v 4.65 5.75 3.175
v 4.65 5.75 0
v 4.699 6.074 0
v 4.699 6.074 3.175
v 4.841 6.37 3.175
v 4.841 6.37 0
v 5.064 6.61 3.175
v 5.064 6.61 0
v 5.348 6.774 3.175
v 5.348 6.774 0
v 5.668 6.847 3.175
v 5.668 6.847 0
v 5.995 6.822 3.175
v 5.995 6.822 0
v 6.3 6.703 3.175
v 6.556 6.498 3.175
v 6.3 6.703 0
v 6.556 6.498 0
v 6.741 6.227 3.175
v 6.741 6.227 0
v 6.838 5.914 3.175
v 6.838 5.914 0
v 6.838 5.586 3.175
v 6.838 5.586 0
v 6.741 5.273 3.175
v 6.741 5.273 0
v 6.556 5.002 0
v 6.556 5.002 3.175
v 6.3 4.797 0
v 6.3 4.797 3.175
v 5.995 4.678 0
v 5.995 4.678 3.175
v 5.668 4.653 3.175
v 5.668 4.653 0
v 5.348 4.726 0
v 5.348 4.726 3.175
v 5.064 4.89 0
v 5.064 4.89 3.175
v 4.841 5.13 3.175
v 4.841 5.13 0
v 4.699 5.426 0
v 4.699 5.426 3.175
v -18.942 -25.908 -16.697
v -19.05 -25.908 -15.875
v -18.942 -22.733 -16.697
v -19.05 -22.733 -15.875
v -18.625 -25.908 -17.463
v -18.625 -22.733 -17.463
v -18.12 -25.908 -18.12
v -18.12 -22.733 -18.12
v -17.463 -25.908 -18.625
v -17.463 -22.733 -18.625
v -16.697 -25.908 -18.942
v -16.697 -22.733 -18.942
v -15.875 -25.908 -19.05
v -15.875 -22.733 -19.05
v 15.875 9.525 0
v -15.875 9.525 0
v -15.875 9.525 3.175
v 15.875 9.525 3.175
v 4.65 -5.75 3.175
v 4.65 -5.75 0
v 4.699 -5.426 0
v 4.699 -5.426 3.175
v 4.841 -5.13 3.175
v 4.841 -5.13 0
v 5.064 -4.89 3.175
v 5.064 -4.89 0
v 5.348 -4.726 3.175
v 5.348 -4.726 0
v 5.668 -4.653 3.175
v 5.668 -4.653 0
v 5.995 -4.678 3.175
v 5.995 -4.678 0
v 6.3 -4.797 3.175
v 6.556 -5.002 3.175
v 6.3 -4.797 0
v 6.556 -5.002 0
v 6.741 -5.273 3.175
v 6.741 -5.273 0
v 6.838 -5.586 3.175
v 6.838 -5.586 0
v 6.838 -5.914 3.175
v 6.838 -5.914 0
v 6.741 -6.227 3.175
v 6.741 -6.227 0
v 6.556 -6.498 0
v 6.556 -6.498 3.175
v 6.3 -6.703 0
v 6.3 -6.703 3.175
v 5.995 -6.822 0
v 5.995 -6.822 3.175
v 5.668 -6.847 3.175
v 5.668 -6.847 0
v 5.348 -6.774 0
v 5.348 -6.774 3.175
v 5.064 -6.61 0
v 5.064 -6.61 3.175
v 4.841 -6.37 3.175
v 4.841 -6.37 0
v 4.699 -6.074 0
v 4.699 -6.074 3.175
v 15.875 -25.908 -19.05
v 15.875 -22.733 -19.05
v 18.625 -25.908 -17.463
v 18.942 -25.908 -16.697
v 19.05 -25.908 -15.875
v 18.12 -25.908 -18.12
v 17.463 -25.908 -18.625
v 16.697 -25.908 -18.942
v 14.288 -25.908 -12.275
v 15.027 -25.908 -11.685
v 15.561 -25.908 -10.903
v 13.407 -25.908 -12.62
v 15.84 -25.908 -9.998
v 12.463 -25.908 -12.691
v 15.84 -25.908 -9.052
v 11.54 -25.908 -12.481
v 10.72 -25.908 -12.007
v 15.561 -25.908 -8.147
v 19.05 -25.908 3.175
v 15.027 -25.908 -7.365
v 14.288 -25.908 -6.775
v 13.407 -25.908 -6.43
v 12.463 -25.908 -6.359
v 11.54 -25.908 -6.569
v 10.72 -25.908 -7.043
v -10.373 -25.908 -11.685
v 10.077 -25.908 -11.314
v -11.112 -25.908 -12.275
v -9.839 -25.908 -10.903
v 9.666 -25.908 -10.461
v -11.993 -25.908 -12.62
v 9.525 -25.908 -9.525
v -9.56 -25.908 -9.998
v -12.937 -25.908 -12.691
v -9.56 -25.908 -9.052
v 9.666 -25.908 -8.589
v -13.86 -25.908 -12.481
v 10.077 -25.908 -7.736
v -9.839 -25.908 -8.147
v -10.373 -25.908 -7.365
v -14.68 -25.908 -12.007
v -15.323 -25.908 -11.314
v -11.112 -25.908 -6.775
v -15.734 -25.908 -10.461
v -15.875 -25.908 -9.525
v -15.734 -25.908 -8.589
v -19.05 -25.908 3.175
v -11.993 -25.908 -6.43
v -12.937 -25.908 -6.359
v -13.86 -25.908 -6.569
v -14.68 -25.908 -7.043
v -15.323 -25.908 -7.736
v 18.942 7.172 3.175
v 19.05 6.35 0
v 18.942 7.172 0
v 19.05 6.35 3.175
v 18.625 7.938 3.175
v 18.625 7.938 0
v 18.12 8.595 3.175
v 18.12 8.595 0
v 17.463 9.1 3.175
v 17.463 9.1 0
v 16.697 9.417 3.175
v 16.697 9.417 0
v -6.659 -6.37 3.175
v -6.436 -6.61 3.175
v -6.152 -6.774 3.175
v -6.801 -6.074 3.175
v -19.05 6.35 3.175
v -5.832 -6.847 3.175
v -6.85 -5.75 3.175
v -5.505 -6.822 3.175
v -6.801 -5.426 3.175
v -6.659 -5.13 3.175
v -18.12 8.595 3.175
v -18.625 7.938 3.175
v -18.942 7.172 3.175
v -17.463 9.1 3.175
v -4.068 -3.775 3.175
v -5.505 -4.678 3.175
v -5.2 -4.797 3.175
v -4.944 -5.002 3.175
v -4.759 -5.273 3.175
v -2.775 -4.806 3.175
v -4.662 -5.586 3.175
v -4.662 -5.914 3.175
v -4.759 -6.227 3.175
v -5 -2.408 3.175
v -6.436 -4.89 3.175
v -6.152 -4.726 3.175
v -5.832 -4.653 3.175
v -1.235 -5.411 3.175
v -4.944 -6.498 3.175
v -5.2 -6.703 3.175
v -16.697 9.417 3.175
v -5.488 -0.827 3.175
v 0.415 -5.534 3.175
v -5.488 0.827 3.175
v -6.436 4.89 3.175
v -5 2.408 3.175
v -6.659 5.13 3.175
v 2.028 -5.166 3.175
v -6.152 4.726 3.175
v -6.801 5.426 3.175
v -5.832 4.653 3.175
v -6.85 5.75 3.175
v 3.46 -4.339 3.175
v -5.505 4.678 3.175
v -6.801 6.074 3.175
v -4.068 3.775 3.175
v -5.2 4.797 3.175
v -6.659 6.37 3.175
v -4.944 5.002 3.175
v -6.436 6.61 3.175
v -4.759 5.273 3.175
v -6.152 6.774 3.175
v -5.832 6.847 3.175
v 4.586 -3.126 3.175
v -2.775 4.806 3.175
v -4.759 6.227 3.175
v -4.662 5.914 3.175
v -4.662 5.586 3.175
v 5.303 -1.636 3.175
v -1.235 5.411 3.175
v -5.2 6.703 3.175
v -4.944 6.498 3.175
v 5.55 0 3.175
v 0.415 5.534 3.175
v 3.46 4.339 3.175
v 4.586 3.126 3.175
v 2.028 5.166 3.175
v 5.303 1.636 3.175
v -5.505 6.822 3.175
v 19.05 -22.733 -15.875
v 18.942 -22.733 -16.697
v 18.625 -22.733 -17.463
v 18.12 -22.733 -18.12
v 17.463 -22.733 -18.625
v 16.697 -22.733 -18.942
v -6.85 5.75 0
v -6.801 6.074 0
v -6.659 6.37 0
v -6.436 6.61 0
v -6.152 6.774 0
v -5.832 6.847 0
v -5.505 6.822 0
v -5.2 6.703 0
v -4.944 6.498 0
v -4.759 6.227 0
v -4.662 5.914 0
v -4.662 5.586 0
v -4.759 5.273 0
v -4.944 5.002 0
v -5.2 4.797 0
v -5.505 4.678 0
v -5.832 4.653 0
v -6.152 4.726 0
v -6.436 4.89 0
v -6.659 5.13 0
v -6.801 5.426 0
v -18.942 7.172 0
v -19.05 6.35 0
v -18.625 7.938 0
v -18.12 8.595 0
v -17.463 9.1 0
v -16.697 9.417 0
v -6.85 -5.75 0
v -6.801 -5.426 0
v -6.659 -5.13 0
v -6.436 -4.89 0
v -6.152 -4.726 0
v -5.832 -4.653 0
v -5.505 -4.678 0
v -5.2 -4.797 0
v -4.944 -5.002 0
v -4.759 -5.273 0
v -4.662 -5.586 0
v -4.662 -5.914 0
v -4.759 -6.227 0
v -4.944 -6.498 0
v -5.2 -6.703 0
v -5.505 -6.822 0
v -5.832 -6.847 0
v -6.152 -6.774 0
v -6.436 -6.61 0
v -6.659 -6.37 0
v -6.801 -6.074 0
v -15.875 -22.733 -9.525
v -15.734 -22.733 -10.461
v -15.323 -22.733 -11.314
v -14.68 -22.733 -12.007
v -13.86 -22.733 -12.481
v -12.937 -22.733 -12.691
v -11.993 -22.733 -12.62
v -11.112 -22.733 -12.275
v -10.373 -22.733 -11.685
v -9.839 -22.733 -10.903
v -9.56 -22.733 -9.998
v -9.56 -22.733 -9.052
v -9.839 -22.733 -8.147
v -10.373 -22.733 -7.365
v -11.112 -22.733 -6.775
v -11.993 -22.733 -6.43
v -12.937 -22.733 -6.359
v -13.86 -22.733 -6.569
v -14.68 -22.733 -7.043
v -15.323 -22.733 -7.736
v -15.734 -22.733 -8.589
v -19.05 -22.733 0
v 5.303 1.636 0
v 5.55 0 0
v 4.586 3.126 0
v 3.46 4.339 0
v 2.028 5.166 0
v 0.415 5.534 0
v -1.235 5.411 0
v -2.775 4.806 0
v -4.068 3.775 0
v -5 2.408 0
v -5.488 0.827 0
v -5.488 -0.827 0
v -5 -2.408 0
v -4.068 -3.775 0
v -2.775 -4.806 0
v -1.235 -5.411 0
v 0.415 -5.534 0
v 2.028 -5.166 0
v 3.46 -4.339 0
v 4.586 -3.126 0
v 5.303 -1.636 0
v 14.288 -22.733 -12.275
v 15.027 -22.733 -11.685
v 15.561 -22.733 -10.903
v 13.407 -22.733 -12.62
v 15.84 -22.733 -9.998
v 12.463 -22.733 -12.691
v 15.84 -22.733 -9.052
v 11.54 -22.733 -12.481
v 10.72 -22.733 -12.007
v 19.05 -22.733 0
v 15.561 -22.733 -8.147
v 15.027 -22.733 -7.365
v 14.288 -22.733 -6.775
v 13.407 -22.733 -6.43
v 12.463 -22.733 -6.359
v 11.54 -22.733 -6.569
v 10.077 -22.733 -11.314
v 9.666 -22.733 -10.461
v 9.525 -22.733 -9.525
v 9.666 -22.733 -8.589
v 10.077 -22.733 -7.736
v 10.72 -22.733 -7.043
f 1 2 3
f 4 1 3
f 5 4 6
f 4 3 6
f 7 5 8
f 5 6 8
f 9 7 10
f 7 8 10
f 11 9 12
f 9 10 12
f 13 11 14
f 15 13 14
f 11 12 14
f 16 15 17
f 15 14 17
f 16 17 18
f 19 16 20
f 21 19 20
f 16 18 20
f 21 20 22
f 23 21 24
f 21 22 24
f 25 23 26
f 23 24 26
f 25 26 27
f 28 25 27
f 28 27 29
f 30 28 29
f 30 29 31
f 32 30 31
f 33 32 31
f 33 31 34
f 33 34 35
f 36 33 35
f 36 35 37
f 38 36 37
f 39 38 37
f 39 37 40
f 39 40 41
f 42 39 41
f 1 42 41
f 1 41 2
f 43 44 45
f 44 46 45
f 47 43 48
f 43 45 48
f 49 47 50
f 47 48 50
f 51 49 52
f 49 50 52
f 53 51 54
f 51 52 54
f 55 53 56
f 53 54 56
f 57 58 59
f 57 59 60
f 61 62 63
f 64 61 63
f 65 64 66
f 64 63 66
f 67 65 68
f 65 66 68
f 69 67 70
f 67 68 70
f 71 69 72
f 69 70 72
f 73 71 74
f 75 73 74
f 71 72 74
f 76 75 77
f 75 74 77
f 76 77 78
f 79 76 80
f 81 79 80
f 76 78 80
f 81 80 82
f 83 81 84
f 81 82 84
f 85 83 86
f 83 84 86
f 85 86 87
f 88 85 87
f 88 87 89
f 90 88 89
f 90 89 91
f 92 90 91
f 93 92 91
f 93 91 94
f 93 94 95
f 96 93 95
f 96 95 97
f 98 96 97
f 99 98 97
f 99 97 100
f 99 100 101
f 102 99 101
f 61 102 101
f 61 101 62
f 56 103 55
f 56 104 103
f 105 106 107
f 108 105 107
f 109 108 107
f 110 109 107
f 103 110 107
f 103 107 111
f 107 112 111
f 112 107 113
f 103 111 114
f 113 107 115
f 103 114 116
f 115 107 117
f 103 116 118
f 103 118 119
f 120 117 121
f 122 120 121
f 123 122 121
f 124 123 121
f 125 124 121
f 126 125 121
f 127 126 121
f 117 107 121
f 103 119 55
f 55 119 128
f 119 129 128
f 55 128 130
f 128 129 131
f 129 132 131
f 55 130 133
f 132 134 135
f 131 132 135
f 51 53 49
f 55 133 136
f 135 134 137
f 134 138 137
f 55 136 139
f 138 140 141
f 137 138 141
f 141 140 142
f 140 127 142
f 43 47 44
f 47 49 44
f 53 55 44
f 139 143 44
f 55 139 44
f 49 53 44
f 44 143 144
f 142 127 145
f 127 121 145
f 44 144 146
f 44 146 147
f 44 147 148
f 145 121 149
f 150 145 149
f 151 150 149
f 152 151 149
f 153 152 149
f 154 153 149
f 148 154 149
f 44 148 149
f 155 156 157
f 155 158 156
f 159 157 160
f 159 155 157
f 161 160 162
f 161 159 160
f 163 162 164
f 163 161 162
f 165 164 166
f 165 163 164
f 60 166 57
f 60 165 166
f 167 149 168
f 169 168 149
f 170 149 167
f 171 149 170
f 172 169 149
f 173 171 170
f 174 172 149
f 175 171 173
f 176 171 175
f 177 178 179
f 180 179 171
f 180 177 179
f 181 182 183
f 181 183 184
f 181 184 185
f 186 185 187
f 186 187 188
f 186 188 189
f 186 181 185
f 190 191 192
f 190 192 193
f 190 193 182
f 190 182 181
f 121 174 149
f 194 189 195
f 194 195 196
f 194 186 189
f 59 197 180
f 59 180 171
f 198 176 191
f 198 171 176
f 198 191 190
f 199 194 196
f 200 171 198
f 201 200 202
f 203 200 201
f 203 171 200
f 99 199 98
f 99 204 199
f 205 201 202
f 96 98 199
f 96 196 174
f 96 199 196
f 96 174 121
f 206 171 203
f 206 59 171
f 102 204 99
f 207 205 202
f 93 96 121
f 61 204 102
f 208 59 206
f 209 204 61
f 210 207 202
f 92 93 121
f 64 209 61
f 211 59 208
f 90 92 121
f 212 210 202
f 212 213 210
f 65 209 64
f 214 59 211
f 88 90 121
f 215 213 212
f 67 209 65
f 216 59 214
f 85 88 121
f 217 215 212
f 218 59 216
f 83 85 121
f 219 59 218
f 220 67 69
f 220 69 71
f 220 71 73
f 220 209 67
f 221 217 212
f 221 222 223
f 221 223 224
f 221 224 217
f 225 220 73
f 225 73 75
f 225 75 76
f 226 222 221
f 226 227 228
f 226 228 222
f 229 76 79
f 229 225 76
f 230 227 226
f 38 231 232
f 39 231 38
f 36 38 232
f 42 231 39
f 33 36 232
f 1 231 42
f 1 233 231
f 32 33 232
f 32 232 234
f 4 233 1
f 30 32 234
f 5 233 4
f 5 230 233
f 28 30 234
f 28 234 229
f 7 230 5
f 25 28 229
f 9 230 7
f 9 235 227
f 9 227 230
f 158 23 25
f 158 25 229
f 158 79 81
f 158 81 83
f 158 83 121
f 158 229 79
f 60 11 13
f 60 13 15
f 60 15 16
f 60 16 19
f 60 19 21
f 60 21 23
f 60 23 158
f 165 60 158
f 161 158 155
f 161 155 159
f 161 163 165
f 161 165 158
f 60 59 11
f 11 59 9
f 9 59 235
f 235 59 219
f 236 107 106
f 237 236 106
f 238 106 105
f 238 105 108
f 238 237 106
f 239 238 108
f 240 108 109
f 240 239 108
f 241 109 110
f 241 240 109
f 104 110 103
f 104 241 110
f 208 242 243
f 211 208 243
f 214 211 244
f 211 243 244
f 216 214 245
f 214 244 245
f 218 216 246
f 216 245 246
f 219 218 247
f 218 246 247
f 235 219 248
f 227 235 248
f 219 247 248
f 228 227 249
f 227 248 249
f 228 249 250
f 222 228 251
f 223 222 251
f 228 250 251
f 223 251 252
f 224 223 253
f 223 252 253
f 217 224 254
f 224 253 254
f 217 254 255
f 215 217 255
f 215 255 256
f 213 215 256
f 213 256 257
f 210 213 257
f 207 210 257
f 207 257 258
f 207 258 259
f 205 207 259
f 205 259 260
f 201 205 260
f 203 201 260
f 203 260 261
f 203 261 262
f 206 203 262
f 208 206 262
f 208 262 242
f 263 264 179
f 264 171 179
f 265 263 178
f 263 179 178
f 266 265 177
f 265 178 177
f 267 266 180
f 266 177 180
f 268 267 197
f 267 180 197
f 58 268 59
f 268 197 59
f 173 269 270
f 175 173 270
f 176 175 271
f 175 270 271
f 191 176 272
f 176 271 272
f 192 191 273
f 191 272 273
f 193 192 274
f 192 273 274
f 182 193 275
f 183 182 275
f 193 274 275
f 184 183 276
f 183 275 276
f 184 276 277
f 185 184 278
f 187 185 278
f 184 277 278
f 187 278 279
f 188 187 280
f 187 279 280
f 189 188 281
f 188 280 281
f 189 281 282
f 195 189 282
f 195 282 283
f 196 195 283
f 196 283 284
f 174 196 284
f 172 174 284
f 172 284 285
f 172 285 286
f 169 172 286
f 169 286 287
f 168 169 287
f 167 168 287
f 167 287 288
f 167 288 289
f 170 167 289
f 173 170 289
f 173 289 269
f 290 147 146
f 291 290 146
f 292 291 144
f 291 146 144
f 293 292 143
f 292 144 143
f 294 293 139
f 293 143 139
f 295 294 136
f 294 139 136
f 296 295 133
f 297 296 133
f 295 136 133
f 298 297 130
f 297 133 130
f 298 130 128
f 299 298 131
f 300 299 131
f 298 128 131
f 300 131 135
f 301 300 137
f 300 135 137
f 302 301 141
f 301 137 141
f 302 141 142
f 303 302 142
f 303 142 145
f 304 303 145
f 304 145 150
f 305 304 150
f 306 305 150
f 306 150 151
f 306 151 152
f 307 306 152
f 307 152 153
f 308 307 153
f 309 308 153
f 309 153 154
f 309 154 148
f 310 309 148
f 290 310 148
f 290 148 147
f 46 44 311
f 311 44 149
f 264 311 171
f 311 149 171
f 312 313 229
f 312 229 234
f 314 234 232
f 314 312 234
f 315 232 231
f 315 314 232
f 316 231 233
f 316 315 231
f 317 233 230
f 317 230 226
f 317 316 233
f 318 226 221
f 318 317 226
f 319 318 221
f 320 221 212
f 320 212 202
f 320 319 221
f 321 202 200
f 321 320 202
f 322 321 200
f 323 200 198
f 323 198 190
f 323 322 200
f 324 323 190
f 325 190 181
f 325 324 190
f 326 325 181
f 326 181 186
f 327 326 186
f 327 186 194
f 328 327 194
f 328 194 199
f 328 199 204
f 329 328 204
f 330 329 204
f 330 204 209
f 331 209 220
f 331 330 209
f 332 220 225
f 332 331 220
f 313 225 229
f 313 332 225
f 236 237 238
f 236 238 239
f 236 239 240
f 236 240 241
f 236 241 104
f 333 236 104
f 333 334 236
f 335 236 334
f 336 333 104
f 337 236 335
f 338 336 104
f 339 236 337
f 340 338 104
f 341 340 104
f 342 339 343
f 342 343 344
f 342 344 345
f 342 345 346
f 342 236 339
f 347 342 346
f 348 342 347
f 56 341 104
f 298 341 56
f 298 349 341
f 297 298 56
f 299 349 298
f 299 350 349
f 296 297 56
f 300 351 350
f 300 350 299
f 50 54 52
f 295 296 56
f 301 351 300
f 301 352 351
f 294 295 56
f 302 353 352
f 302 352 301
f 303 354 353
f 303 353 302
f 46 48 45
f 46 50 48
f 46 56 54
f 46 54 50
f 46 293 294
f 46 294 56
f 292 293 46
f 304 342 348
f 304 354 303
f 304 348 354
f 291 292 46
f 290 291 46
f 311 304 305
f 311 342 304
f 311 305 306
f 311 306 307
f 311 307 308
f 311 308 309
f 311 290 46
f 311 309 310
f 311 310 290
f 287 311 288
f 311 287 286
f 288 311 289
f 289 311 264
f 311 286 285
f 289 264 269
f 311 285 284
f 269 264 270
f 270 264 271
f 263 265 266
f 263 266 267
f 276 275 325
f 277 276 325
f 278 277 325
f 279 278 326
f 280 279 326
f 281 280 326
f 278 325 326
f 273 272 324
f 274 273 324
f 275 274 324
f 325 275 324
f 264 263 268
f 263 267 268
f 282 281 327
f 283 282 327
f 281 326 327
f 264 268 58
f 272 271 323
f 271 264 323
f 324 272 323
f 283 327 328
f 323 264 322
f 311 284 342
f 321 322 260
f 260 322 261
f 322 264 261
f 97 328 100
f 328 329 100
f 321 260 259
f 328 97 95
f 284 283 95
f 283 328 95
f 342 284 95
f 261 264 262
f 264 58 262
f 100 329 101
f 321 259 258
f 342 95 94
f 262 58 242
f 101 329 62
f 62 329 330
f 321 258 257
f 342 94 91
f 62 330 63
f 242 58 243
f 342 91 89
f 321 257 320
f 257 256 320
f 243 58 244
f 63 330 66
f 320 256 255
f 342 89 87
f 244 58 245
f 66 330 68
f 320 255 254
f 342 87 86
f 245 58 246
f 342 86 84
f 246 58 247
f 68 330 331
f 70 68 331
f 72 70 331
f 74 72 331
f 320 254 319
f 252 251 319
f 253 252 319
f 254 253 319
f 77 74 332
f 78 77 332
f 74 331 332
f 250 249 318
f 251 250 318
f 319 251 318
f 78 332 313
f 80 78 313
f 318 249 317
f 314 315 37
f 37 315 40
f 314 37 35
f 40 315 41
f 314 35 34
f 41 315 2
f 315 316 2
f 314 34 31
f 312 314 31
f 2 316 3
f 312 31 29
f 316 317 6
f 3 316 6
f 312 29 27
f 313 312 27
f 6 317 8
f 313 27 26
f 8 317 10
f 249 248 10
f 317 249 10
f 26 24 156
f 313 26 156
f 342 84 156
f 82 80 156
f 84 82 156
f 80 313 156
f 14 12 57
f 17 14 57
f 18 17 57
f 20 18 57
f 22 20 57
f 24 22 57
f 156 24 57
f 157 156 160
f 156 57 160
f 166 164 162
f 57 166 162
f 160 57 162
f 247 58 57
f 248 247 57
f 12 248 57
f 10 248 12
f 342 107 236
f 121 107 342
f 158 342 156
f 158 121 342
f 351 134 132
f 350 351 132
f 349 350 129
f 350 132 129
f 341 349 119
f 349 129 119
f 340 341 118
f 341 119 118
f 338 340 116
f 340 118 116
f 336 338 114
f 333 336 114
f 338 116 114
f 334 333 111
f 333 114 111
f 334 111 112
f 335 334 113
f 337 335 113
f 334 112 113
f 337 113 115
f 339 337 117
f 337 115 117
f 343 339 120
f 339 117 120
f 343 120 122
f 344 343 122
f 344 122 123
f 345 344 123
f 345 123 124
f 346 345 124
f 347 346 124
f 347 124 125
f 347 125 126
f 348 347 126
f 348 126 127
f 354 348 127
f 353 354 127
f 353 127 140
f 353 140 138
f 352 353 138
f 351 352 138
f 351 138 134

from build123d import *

# Parameters (mm, degrees)
SKETCH1_W                   = 38.1
SKETCH1_H                   = 35.433
SKETCH1_R                   = 5.55
BOSS_EXTRUDE1_DEPTH         = 3.175
SKETCH3_W                   = 38.1
SKETCH3_H                   = 3.175
BOSS_EXTRUDE2_DEPTH         = 19.05
FILLET1_R                   = 3.175
M2_CLEARANCE_HOLE1_D        = 2.2
F_1_4_0_25_DIAMETER_HOLE1_D = 6.35


with BuildPart() as part:
    # Sketch1 → Boss-Extrude1 (new body)
    with BuildSketch(Plane.XY):
        with Locations((0, -8.1915)):
            Rectangle(SKETCH1_W, SKETCH1_H)
        Circle(SKETCH1_R, mode=Mode.SUBTRACT)
    extrude(amount=BOSS_EXTRUDE1_DEPTH)

    # Sketch3 → Boss-Extrude2 (add)
    with BuildSketch(Plane(origin=(0, 0, 0), x_dir=(-1, 0, 0), z_dir=(0, 0, -1))):
        with Locations((0, -24.3205)):
            Rectangle(SKETCH3_W, SKETCH3_H)
    extrude(amount=BOSS_EXTRUDE2_DEPTH)

    # Fillet1
    fillet1_edges = [part.edges().sort_by_distance(p)[0] for p in [
        (-19.05, -24.3205, -19.05),
        (19.05, -24.3205, -19.05),
        (-19.05, 9.525, 1.5875),
        (19.05, 9.525, 1.5875),
    ]]
    fillet(fillet1_edges, radius=FILLET1_R)

    # M2 Clearance Hole1 (through all)
    with Locations(Plane(origin=(0, -25.908, 3.175), x_dir=(1, 0, 0), z_dir=(0, 0, 1))):
        with Locations((5.75, 31.658), (-5.75, 31.658), (5.75, 20.158), (-5.75, 20.158)):
            Hole(M2_CLEARANCE_HOLE1_D / 2)

    # 1/4 (0.25) Diameter Hole1 (through all)
    with Locations(Plane(origin=(0, -22.733, 0), x_dir=(1, 0, 0), z_dir=(0, 1, 0))):
        with Locations((-12.7, 9.525), (12.7, 9.525)):
            Hole(F_1_4_0_25_DIAMETER_HOLE1_D / 2)


solid = part.part
